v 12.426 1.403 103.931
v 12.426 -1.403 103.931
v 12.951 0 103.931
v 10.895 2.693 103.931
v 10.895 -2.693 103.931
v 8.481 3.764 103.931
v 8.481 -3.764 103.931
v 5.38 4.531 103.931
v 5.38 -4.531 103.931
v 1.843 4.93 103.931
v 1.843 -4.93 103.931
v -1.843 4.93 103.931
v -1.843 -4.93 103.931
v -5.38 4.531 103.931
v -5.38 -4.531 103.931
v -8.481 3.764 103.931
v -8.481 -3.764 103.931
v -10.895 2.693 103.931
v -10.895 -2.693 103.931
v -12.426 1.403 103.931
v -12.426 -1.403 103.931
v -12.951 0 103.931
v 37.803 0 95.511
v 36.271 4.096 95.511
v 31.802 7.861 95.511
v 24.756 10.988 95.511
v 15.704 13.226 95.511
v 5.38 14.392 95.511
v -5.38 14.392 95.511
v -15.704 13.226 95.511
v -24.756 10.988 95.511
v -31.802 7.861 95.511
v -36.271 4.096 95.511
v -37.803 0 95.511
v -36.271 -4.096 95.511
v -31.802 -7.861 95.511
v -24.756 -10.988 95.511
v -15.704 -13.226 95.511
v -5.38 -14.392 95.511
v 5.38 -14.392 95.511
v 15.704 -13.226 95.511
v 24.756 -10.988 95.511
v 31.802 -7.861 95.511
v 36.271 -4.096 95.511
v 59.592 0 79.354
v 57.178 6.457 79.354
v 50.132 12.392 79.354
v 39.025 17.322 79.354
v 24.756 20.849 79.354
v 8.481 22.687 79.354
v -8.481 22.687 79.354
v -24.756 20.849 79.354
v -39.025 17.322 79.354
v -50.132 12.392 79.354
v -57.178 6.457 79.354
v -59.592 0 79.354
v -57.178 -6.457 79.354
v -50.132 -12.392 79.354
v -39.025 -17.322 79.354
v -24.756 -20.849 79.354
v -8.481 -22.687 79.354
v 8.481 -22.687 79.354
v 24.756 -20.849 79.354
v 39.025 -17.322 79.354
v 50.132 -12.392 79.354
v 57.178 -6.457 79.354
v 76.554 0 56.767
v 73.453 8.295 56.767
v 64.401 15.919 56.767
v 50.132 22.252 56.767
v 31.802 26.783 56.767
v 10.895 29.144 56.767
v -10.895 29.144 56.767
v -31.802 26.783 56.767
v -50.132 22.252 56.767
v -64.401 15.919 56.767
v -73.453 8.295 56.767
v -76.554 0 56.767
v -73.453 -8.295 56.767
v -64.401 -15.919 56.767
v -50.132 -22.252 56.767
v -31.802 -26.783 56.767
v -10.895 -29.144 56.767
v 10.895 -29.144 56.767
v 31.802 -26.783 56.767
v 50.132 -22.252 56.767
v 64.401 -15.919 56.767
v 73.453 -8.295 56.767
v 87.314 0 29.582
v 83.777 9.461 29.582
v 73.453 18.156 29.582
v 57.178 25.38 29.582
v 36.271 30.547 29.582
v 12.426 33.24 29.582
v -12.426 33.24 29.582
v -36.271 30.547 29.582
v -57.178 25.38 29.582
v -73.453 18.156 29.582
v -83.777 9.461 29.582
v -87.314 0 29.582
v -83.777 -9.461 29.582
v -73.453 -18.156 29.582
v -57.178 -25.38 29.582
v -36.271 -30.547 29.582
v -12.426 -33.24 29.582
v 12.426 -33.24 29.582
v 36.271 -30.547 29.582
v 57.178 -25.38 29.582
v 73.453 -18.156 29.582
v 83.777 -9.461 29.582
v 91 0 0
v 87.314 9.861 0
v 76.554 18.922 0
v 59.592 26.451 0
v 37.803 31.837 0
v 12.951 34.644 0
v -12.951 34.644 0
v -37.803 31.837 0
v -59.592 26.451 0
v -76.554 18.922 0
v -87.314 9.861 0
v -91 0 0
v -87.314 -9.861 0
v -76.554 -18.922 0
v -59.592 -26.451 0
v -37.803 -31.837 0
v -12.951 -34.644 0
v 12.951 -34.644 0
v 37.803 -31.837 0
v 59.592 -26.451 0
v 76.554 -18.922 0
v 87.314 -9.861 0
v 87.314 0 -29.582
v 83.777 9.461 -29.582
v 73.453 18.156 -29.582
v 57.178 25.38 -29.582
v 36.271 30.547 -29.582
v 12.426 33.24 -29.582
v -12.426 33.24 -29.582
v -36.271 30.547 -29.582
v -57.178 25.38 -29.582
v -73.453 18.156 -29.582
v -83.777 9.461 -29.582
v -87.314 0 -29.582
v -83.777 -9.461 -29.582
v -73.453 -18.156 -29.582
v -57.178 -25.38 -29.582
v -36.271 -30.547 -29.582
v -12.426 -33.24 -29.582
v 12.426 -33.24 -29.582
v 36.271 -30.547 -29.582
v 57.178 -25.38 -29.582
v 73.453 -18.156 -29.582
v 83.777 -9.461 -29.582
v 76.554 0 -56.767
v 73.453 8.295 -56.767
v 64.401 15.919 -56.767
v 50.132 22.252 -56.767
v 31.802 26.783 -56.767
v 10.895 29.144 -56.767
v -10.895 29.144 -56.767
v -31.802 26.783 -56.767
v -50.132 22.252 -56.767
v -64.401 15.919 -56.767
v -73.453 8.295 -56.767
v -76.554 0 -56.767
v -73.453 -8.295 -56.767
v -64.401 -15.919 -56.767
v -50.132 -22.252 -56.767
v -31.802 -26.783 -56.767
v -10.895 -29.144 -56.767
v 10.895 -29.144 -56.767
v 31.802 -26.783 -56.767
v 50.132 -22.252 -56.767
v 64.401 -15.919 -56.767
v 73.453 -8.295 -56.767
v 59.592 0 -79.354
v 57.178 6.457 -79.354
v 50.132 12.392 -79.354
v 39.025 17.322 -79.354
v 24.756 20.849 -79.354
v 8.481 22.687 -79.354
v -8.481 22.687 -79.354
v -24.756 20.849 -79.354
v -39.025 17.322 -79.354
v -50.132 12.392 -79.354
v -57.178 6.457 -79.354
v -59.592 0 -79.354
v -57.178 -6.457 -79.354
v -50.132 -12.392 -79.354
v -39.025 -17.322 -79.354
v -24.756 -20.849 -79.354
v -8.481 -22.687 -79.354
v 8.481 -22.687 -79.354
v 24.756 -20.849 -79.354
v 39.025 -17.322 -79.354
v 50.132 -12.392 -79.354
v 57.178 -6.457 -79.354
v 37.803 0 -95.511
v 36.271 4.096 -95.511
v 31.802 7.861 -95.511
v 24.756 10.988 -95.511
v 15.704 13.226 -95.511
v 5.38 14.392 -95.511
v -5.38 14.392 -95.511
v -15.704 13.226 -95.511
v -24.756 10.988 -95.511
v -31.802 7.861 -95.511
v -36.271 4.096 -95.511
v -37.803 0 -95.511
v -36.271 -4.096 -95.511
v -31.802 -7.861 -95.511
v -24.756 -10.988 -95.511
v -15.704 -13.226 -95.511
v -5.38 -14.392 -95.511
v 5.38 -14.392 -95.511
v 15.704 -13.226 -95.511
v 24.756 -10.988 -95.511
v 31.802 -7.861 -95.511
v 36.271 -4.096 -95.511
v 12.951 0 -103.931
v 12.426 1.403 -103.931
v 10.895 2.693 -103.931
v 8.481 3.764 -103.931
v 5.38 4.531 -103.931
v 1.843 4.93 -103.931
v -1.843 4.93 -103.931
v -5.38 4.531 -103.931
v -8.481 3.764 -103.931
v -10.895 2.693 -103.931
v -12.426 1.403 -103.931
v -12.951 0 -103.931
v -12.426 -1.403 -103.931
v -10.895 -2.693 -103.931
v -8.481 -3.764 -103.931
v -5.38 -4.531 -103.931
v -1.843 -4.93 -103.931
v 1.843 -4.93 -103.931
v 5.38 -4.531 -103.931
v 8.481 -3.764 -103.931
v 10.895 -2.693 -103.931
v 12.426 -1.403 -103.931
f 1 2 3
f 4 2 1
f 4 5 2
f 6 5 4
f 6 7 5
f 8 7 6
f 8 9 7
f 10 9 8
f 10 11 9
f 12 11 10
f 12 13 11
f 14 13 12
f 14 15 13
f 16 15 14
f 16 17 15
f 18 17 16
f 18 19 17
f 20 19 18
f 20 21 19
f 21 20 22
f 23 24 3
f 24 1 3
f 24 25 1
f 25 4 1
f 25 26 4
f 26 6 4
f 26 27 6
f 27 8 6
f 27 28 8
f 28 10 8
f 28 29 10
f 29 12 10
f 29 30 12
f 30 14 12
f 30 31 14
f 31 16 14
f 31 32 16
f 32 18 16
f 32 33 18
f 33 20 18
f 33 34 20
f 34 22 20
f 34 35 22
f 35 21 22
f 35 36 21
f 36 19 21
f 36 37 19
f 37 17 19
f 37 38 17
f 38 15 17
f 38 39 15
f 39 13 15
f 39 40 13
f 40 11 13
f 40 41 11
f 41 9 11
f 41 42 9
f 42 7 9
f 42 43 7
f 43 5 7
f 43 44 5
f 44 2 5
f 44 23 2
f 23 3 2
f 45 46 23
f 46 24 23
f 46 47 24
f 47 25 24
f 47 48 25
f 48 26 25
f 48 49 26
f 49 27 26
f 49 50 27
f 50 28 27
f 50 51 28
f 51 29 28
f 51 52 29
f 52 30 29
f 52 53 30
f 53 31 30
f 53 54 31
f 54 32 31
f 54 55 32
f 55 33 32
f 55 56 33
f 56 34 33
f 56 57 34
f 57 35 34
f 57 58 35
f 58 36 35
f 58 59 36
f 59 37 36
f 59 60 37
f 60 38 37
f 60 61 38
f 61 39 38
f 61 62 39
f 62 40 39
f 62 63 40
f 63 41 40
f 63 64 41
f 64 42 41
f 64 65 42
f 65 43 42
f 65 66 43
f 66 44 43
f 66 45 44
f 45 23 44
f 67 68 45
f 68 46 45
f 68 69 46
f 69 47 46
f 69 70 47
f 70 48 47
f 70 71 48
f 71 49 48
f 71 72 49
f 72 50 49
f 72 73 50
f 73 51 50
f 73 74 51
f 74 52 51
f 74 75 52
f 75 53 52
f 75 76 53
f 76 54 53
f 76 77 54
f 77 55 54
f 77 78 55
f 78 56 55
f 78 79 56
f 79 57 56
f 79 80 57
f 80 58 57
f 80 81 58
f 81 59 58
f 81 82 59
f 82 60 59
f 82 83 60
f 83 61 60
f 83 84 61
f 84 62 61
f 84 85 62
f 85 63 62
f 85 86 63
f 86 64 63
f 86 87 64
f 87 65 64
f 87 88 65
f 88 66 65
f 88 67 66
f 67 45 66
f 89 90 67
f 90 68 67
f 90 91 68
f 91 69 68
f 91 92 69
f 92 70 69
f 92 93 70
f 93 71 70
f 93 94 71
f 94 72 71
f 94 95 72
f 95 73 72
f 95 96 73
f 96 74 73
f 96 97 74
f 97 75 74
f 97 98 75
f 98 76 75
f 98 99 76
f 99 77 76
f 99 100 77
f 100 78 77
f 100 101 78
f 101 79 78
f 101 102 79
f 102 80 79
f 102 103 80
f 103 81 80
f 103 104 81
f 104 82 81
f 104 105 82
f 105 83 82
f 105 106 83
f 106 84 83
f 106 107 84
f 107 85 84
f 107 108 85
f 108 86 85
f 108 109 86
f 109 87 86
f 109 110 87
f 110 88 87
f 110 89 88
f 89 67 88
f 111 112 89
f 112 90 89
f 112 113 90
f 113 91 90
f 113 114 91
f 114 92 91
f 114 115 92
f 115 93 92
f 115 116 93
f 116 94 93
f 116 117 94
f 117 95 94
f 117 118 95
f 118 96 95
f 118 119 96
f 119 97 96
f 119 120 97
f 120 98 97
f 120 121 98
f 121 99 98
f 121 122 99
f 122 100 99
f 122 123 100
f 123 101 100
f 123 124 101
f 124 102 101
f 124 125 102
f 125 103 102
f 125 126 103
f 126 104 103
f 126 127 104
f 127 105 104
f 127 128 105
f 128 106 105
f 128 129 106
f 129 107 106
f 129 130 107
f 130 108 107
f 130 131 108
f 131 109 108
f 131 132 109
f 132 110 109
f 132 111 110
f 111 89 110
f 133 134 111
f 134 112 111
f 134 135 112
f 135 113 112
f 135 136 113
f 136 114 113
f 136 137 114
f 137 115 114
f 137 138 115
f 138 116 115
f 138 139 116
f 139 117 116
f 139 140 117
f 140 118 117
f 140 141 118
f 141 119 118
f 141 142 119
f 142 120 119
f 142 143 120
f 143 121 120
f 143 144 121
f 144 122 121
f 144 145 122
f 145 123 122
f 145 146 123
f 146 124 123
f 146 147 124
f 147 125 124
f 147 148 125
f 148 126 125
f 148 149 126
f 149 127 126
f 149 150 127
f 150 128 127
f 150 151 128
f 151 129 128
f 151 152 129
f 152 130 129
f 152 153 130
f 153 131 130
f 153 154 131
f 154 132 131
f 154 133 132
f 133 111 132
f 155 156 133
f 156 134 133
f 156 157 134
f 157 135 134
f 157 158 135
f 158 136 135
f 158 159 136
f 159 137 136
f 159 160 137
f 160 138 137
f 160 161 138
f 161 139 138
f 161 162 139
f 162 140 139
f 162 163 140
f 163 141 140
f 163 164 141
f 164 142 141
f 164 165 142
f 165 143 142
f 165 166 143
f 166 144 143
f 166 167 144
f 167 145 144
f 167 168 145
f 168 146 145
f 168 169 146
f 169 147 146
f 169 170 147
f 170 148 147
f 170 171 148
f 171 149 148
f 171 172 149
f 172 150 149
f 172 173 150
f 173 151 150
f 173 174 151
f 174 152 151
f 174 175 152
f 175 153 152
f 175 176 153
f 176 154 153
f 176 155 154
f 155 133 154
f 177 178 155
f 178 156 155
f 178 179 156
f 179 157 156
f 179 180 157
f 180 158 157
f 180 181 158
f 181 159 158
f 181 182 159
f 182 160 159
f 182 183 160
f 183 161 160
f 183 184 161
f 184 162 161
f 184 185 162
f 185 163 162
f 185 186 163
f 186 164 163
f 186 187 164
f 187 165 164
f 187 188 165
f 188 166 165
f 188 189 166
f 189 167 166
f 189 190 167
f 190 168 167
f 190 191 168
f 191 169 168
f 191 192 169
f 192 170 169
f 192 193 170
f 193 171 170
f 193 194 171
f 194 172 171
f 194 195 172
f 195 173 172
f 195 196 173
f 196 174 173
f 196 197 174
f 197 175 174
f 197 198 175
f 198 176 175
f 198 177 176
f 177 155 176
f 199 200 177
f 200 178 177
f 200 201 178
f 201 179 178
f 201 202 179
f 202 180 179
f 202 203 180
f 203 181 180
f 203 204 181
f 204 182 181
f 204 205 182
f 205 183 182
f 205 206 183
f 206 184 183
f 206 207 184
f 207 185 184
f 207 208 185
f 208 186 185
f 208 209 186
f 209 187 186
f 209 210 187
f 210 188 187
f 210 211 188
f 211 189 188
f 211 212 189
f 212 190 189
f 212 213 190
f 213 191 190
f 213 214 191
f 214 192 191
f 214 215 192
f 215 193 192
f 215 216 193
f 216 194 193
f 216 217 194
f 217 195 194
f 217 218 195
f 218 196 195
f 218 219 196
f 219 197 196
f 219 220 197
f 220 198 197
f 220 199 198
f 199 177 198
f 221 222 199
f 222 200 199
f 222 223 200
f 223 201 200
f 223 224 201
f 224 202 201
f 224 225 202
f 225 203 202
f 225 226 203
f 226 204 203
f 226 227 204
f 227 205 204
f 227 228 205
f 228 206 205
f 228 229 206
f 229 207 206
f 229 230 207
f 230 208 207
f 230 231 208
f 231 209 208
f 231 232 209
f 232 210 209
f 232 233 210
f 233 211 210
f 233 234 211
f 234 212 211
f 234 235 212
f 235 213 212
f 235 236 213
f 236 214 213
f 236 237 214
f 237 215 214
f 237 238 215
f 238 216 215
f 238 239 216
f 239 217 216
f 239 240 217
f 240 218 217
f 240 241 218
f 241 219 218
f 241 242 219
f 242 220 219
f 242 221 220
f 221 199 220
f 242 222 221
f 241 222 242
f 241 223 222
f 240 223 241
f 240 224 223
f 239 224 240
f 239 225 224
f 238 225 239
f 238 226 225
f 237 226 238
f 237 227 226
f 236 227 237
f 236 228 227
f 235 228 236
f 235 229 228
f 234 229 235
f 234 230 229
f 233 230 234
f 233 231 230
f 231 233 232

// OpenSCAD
// Generated by SolidPython 1.0.1 on 2020-07-29 00:46:50


scale(v = [13, 5, 15]) {
	sphere(r = 7);
}
/***********************************************
*********      SolidPython code:      **********
************************************************
 
# import packages: SolidPython
from solid import *
from solid.utils import *
from itertools import chain, combinations, permutations


class Resize:

    def __init__(self, scad_file):
        self.scad_file = scad_file
        #self.scad_file = import_scad(scad_file)
        # cone/cylinder param:
        self.r1 = 0
        self.r2 = 0
        self.h = 0
        # rectangular prism param:
        self.w = 0
        self.l = 0
        # ellipse param:
        self.r = 0

    # import OpenScad code (file name corresponds to shape)


    # classify shape + parameters
    def assign(self, param1, param2, param3):
        if self.scad_file == 'cone.scad':
            self.r1 = param1
            self.r2 = param2
            self.h = param3
        elif self.scad_file == 'cylinder.scad':
            self.r1 = param1
            self.r2 = param2
            self.h = param3
        elif self.scad_file == 'rectangularPrism.scad':
            self.h = param1
            self.l = param2
            self.w = param3
        else:
            self.r = param1
            self.h = param2

    # resize parameters
    def iterate(self):
        x = range(3, 20, 2)
        i = 1
        if self.scad_file == 'cone.scad':
            tempList = list(permutations(x, 2))
            for temp in tempList:
                param1 = temp[0]
                param2 = temp[1]
                filepath = 'produced_scad_files/' + 'cone' + str(param1) + '_' + str(param2) + '_' + '.scad'
                scad_render_to_file(cylinder(h=param1, r1=param2, r2=0), filepath)

        elif self.scad_file == 'cylinder.scad':
            tempList = list(permutations(x, 3))
            for temp in tempList:
                param1 = temp[0]
                param2 = temp[1]
                filepath = 'produced_scad_files/' + 'cylinder' + str(param1) + '_' + str(param2) + '_' + '.scad'
                scad_render_to_file(cylinder(h=param1, r1=param2, r2=param2), filepath)

        elif self.scad_file == 'rectangularPrism.scad':
            tempList = list(permutations(x, 3))
            for temp in tempList:
                param1 = temp[0]
                param2 = temp[1]
                param3 = temp[2]
                filepath = 'produced_scad_files/' + 'rectangularPrism' + str(param1) + '_' + str(param2) + '_' + str(
                    param3) + '.scad'
                scad_render_to_file(cube(size=(param1, param2, param3)), filepath)

        elif self.scad_file == 'ellipse.scad':
            tempList = list(permutations(x, 4))
            for temp in tempList:
                param1 = temp[0]
                param2 = temp[1]
                param3 = temp[2]
                param4 = temp[3]
                filepath = 'produced_scad_files/' + 'ellipse' + str(param1) + '_' + str(param2) + '_' + str(param3) + '_' + str(param4) + '.scad'
                scad_render_to_file(scale([param1, param2, param3])(sphere(r=param4)), filepath)

    def render_to_scadfile(self):
        scad_render_to_file(scad, 'example.scad') 
 
************************************************/
